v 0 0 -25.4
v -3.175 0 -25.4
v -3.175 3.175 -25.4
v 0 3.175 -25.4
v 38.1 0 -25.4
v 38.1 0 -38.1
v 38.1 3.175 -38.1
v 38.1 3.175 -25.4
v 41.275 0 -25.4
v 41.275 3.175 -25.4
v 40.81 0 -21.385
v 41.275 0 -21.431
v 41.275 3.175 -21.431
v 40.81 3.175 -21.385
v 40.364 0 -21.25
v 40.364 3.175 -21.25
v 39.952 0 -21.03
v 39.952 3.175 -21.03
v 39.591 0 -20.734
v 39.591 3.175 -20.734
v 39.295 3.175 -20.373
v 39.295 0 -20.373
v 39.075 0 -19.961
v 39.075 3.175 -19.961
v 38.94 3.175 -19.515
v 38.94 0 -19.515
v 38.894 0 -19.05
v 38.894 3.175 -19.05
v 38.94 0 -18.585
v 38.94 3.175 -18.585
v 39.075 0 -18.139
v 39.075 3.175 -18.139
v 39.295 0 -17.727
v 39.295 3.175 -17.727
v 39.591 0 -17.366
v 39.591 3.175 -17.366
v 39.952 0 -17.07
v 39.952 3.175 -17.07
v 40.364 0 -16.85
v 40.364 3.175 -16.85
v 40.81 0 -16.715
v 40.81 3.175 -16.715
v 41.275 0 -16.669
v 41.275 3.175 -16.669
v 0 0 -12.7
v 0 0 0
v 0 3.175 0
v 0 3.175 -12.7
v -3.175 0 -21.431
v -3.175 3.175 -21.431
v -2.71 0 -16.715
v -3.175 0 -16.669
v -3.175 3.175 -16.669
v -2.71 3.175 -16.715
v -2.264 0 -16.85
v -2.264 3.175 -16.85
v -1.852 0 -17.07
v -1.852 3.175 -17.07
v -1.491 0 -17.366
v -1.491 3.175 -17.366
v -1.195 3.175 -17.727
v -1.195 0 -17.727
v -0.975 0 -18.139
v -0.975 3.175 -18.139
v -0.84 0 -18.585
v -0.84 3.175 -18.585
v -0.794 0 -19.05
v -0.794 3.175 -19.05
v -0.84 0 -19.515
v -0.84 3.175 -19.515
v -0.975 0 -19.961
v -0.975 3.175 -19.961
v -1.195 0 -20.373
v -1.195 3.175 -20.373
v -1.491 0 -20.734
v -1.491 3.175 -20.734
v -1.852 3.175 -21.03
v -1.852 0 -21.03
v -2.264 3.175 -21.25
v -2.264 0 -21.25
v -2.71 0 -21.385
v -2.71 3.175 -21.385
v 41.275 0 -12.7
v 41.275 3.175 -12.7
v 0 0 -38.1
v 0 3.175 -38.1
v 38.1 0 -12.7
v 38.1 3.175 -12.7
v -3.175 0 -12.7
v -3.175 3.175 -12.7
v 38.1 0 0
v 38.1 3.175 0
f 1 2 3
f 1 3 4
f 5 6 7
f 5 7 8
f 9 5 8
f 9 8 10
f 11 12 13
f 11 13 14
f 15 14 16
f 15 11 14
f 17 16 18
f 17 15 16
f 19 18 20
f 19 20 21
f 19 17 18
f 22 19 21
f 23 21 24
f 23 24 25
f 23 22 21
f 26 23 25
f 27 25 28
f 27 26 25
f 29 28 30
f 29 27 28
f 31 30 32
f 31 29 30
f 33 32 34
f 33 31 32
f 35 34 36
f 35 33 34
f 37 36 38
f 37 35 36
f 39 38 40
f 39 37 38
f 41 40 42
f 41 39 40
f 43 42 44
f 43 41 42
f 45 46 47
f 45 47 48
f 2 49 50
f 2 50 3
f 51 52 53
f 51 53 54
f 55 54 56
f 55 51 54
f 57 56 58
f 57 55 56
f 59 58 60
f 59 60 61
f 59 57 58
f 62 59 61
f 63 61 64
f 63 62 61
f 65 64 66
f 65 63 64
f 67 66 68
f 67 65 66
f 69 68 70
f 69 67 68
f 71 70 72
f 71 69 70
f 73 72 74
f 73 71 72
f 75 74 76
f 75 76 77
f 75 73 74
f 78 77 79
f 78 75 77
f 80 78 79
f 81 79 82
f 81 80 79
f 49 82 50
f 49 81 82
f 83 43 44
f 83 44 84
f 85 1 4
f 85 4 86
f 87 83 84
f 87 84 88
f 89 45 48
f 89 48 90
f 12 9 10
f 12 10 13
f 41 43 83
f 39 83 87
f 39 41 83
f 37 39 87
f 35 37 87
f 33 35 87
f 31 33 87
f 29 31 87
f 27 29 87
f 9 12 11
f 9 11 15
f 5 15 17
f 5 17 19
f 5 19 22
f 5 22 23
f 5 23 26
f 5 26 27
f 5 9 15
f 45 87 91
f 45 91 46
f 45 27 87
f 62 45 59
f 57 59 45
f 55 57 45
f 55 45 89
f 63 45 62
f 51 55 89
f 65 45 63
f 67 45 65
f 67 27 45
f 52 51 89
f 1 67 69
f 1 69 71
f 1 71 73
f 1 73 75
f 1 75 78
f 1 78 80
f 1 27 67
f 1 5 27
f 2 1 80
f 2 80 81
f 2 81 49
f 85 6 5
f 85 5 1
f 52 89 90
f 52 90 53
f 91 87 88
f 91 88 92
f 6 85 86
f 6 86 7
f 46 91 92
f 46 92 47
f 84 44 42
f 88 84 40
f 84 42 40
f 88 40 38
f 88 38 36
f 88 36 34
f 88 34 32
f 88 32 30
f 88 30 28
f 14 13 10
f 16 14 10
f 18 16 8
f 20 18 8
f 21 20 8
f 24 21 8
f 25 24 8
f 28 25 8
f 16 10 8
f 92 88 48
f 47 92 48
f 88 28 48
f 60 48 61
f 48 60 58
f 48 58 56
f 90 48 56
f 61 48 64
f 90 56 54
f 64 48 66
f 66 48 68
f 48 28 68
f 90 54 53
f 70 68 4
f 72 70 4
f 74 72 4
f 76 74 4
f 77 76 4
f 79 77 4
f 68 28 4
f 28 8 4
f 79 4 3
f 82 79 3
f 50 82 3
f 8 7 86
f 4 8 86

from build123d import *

# Parameters (mm, degrees)
BOSS_EXTRUDE1_DEPTH = 3.175


with BuildPart() as part:
    # Sketch1 → Boss-Extrude1 (new body)
    with BuildSketch(Plane(origin=(0, 0, 0), x_dir=(1, 0, 0), z_dir=(0, 1, 0))):
        with BuildLine():
            Line((0, 0), (0, 12.7))
            Line((0, 12.7), (-3.175, 12.7))
            Line((-3.175, 12.7), (-3.175, 16.66875))
            ThreePointArc((-3.175, 16.66875), (-0.79375, 19.05), (-3.175, 21.43125))
            Line((-3.175, 21.43125), (-3.175, 25.4))
            Line((-3.175, 25.4), (0, 25.4))
            Line((0, 25.4), (0, 38.1))
            Line((0, 38.1), (38.1, 38.1))
            Line((38.1, 38.1), (38.1, 25.4))
            Line((38.1, 25.4), (41.275, 25.4))
            Line((41.275, 25.4), (41.275, 21.43125))
            ThreePointArc((41.275, 21.43125), (38.89375, 19.05), (41.275, 16.66875))
            Line((41.275, 16.66875), (41.275, 12.7))
            Line((41.275, 12.7), (38.1, 12.7))
            Line((38.1, 12.7), (38.1, 0))
            Line((38.1, 0), (0, 0))
        make_face()
    extrude(amount=BOSS_EXTRUDE1_DEPTH)


solid = part.part
